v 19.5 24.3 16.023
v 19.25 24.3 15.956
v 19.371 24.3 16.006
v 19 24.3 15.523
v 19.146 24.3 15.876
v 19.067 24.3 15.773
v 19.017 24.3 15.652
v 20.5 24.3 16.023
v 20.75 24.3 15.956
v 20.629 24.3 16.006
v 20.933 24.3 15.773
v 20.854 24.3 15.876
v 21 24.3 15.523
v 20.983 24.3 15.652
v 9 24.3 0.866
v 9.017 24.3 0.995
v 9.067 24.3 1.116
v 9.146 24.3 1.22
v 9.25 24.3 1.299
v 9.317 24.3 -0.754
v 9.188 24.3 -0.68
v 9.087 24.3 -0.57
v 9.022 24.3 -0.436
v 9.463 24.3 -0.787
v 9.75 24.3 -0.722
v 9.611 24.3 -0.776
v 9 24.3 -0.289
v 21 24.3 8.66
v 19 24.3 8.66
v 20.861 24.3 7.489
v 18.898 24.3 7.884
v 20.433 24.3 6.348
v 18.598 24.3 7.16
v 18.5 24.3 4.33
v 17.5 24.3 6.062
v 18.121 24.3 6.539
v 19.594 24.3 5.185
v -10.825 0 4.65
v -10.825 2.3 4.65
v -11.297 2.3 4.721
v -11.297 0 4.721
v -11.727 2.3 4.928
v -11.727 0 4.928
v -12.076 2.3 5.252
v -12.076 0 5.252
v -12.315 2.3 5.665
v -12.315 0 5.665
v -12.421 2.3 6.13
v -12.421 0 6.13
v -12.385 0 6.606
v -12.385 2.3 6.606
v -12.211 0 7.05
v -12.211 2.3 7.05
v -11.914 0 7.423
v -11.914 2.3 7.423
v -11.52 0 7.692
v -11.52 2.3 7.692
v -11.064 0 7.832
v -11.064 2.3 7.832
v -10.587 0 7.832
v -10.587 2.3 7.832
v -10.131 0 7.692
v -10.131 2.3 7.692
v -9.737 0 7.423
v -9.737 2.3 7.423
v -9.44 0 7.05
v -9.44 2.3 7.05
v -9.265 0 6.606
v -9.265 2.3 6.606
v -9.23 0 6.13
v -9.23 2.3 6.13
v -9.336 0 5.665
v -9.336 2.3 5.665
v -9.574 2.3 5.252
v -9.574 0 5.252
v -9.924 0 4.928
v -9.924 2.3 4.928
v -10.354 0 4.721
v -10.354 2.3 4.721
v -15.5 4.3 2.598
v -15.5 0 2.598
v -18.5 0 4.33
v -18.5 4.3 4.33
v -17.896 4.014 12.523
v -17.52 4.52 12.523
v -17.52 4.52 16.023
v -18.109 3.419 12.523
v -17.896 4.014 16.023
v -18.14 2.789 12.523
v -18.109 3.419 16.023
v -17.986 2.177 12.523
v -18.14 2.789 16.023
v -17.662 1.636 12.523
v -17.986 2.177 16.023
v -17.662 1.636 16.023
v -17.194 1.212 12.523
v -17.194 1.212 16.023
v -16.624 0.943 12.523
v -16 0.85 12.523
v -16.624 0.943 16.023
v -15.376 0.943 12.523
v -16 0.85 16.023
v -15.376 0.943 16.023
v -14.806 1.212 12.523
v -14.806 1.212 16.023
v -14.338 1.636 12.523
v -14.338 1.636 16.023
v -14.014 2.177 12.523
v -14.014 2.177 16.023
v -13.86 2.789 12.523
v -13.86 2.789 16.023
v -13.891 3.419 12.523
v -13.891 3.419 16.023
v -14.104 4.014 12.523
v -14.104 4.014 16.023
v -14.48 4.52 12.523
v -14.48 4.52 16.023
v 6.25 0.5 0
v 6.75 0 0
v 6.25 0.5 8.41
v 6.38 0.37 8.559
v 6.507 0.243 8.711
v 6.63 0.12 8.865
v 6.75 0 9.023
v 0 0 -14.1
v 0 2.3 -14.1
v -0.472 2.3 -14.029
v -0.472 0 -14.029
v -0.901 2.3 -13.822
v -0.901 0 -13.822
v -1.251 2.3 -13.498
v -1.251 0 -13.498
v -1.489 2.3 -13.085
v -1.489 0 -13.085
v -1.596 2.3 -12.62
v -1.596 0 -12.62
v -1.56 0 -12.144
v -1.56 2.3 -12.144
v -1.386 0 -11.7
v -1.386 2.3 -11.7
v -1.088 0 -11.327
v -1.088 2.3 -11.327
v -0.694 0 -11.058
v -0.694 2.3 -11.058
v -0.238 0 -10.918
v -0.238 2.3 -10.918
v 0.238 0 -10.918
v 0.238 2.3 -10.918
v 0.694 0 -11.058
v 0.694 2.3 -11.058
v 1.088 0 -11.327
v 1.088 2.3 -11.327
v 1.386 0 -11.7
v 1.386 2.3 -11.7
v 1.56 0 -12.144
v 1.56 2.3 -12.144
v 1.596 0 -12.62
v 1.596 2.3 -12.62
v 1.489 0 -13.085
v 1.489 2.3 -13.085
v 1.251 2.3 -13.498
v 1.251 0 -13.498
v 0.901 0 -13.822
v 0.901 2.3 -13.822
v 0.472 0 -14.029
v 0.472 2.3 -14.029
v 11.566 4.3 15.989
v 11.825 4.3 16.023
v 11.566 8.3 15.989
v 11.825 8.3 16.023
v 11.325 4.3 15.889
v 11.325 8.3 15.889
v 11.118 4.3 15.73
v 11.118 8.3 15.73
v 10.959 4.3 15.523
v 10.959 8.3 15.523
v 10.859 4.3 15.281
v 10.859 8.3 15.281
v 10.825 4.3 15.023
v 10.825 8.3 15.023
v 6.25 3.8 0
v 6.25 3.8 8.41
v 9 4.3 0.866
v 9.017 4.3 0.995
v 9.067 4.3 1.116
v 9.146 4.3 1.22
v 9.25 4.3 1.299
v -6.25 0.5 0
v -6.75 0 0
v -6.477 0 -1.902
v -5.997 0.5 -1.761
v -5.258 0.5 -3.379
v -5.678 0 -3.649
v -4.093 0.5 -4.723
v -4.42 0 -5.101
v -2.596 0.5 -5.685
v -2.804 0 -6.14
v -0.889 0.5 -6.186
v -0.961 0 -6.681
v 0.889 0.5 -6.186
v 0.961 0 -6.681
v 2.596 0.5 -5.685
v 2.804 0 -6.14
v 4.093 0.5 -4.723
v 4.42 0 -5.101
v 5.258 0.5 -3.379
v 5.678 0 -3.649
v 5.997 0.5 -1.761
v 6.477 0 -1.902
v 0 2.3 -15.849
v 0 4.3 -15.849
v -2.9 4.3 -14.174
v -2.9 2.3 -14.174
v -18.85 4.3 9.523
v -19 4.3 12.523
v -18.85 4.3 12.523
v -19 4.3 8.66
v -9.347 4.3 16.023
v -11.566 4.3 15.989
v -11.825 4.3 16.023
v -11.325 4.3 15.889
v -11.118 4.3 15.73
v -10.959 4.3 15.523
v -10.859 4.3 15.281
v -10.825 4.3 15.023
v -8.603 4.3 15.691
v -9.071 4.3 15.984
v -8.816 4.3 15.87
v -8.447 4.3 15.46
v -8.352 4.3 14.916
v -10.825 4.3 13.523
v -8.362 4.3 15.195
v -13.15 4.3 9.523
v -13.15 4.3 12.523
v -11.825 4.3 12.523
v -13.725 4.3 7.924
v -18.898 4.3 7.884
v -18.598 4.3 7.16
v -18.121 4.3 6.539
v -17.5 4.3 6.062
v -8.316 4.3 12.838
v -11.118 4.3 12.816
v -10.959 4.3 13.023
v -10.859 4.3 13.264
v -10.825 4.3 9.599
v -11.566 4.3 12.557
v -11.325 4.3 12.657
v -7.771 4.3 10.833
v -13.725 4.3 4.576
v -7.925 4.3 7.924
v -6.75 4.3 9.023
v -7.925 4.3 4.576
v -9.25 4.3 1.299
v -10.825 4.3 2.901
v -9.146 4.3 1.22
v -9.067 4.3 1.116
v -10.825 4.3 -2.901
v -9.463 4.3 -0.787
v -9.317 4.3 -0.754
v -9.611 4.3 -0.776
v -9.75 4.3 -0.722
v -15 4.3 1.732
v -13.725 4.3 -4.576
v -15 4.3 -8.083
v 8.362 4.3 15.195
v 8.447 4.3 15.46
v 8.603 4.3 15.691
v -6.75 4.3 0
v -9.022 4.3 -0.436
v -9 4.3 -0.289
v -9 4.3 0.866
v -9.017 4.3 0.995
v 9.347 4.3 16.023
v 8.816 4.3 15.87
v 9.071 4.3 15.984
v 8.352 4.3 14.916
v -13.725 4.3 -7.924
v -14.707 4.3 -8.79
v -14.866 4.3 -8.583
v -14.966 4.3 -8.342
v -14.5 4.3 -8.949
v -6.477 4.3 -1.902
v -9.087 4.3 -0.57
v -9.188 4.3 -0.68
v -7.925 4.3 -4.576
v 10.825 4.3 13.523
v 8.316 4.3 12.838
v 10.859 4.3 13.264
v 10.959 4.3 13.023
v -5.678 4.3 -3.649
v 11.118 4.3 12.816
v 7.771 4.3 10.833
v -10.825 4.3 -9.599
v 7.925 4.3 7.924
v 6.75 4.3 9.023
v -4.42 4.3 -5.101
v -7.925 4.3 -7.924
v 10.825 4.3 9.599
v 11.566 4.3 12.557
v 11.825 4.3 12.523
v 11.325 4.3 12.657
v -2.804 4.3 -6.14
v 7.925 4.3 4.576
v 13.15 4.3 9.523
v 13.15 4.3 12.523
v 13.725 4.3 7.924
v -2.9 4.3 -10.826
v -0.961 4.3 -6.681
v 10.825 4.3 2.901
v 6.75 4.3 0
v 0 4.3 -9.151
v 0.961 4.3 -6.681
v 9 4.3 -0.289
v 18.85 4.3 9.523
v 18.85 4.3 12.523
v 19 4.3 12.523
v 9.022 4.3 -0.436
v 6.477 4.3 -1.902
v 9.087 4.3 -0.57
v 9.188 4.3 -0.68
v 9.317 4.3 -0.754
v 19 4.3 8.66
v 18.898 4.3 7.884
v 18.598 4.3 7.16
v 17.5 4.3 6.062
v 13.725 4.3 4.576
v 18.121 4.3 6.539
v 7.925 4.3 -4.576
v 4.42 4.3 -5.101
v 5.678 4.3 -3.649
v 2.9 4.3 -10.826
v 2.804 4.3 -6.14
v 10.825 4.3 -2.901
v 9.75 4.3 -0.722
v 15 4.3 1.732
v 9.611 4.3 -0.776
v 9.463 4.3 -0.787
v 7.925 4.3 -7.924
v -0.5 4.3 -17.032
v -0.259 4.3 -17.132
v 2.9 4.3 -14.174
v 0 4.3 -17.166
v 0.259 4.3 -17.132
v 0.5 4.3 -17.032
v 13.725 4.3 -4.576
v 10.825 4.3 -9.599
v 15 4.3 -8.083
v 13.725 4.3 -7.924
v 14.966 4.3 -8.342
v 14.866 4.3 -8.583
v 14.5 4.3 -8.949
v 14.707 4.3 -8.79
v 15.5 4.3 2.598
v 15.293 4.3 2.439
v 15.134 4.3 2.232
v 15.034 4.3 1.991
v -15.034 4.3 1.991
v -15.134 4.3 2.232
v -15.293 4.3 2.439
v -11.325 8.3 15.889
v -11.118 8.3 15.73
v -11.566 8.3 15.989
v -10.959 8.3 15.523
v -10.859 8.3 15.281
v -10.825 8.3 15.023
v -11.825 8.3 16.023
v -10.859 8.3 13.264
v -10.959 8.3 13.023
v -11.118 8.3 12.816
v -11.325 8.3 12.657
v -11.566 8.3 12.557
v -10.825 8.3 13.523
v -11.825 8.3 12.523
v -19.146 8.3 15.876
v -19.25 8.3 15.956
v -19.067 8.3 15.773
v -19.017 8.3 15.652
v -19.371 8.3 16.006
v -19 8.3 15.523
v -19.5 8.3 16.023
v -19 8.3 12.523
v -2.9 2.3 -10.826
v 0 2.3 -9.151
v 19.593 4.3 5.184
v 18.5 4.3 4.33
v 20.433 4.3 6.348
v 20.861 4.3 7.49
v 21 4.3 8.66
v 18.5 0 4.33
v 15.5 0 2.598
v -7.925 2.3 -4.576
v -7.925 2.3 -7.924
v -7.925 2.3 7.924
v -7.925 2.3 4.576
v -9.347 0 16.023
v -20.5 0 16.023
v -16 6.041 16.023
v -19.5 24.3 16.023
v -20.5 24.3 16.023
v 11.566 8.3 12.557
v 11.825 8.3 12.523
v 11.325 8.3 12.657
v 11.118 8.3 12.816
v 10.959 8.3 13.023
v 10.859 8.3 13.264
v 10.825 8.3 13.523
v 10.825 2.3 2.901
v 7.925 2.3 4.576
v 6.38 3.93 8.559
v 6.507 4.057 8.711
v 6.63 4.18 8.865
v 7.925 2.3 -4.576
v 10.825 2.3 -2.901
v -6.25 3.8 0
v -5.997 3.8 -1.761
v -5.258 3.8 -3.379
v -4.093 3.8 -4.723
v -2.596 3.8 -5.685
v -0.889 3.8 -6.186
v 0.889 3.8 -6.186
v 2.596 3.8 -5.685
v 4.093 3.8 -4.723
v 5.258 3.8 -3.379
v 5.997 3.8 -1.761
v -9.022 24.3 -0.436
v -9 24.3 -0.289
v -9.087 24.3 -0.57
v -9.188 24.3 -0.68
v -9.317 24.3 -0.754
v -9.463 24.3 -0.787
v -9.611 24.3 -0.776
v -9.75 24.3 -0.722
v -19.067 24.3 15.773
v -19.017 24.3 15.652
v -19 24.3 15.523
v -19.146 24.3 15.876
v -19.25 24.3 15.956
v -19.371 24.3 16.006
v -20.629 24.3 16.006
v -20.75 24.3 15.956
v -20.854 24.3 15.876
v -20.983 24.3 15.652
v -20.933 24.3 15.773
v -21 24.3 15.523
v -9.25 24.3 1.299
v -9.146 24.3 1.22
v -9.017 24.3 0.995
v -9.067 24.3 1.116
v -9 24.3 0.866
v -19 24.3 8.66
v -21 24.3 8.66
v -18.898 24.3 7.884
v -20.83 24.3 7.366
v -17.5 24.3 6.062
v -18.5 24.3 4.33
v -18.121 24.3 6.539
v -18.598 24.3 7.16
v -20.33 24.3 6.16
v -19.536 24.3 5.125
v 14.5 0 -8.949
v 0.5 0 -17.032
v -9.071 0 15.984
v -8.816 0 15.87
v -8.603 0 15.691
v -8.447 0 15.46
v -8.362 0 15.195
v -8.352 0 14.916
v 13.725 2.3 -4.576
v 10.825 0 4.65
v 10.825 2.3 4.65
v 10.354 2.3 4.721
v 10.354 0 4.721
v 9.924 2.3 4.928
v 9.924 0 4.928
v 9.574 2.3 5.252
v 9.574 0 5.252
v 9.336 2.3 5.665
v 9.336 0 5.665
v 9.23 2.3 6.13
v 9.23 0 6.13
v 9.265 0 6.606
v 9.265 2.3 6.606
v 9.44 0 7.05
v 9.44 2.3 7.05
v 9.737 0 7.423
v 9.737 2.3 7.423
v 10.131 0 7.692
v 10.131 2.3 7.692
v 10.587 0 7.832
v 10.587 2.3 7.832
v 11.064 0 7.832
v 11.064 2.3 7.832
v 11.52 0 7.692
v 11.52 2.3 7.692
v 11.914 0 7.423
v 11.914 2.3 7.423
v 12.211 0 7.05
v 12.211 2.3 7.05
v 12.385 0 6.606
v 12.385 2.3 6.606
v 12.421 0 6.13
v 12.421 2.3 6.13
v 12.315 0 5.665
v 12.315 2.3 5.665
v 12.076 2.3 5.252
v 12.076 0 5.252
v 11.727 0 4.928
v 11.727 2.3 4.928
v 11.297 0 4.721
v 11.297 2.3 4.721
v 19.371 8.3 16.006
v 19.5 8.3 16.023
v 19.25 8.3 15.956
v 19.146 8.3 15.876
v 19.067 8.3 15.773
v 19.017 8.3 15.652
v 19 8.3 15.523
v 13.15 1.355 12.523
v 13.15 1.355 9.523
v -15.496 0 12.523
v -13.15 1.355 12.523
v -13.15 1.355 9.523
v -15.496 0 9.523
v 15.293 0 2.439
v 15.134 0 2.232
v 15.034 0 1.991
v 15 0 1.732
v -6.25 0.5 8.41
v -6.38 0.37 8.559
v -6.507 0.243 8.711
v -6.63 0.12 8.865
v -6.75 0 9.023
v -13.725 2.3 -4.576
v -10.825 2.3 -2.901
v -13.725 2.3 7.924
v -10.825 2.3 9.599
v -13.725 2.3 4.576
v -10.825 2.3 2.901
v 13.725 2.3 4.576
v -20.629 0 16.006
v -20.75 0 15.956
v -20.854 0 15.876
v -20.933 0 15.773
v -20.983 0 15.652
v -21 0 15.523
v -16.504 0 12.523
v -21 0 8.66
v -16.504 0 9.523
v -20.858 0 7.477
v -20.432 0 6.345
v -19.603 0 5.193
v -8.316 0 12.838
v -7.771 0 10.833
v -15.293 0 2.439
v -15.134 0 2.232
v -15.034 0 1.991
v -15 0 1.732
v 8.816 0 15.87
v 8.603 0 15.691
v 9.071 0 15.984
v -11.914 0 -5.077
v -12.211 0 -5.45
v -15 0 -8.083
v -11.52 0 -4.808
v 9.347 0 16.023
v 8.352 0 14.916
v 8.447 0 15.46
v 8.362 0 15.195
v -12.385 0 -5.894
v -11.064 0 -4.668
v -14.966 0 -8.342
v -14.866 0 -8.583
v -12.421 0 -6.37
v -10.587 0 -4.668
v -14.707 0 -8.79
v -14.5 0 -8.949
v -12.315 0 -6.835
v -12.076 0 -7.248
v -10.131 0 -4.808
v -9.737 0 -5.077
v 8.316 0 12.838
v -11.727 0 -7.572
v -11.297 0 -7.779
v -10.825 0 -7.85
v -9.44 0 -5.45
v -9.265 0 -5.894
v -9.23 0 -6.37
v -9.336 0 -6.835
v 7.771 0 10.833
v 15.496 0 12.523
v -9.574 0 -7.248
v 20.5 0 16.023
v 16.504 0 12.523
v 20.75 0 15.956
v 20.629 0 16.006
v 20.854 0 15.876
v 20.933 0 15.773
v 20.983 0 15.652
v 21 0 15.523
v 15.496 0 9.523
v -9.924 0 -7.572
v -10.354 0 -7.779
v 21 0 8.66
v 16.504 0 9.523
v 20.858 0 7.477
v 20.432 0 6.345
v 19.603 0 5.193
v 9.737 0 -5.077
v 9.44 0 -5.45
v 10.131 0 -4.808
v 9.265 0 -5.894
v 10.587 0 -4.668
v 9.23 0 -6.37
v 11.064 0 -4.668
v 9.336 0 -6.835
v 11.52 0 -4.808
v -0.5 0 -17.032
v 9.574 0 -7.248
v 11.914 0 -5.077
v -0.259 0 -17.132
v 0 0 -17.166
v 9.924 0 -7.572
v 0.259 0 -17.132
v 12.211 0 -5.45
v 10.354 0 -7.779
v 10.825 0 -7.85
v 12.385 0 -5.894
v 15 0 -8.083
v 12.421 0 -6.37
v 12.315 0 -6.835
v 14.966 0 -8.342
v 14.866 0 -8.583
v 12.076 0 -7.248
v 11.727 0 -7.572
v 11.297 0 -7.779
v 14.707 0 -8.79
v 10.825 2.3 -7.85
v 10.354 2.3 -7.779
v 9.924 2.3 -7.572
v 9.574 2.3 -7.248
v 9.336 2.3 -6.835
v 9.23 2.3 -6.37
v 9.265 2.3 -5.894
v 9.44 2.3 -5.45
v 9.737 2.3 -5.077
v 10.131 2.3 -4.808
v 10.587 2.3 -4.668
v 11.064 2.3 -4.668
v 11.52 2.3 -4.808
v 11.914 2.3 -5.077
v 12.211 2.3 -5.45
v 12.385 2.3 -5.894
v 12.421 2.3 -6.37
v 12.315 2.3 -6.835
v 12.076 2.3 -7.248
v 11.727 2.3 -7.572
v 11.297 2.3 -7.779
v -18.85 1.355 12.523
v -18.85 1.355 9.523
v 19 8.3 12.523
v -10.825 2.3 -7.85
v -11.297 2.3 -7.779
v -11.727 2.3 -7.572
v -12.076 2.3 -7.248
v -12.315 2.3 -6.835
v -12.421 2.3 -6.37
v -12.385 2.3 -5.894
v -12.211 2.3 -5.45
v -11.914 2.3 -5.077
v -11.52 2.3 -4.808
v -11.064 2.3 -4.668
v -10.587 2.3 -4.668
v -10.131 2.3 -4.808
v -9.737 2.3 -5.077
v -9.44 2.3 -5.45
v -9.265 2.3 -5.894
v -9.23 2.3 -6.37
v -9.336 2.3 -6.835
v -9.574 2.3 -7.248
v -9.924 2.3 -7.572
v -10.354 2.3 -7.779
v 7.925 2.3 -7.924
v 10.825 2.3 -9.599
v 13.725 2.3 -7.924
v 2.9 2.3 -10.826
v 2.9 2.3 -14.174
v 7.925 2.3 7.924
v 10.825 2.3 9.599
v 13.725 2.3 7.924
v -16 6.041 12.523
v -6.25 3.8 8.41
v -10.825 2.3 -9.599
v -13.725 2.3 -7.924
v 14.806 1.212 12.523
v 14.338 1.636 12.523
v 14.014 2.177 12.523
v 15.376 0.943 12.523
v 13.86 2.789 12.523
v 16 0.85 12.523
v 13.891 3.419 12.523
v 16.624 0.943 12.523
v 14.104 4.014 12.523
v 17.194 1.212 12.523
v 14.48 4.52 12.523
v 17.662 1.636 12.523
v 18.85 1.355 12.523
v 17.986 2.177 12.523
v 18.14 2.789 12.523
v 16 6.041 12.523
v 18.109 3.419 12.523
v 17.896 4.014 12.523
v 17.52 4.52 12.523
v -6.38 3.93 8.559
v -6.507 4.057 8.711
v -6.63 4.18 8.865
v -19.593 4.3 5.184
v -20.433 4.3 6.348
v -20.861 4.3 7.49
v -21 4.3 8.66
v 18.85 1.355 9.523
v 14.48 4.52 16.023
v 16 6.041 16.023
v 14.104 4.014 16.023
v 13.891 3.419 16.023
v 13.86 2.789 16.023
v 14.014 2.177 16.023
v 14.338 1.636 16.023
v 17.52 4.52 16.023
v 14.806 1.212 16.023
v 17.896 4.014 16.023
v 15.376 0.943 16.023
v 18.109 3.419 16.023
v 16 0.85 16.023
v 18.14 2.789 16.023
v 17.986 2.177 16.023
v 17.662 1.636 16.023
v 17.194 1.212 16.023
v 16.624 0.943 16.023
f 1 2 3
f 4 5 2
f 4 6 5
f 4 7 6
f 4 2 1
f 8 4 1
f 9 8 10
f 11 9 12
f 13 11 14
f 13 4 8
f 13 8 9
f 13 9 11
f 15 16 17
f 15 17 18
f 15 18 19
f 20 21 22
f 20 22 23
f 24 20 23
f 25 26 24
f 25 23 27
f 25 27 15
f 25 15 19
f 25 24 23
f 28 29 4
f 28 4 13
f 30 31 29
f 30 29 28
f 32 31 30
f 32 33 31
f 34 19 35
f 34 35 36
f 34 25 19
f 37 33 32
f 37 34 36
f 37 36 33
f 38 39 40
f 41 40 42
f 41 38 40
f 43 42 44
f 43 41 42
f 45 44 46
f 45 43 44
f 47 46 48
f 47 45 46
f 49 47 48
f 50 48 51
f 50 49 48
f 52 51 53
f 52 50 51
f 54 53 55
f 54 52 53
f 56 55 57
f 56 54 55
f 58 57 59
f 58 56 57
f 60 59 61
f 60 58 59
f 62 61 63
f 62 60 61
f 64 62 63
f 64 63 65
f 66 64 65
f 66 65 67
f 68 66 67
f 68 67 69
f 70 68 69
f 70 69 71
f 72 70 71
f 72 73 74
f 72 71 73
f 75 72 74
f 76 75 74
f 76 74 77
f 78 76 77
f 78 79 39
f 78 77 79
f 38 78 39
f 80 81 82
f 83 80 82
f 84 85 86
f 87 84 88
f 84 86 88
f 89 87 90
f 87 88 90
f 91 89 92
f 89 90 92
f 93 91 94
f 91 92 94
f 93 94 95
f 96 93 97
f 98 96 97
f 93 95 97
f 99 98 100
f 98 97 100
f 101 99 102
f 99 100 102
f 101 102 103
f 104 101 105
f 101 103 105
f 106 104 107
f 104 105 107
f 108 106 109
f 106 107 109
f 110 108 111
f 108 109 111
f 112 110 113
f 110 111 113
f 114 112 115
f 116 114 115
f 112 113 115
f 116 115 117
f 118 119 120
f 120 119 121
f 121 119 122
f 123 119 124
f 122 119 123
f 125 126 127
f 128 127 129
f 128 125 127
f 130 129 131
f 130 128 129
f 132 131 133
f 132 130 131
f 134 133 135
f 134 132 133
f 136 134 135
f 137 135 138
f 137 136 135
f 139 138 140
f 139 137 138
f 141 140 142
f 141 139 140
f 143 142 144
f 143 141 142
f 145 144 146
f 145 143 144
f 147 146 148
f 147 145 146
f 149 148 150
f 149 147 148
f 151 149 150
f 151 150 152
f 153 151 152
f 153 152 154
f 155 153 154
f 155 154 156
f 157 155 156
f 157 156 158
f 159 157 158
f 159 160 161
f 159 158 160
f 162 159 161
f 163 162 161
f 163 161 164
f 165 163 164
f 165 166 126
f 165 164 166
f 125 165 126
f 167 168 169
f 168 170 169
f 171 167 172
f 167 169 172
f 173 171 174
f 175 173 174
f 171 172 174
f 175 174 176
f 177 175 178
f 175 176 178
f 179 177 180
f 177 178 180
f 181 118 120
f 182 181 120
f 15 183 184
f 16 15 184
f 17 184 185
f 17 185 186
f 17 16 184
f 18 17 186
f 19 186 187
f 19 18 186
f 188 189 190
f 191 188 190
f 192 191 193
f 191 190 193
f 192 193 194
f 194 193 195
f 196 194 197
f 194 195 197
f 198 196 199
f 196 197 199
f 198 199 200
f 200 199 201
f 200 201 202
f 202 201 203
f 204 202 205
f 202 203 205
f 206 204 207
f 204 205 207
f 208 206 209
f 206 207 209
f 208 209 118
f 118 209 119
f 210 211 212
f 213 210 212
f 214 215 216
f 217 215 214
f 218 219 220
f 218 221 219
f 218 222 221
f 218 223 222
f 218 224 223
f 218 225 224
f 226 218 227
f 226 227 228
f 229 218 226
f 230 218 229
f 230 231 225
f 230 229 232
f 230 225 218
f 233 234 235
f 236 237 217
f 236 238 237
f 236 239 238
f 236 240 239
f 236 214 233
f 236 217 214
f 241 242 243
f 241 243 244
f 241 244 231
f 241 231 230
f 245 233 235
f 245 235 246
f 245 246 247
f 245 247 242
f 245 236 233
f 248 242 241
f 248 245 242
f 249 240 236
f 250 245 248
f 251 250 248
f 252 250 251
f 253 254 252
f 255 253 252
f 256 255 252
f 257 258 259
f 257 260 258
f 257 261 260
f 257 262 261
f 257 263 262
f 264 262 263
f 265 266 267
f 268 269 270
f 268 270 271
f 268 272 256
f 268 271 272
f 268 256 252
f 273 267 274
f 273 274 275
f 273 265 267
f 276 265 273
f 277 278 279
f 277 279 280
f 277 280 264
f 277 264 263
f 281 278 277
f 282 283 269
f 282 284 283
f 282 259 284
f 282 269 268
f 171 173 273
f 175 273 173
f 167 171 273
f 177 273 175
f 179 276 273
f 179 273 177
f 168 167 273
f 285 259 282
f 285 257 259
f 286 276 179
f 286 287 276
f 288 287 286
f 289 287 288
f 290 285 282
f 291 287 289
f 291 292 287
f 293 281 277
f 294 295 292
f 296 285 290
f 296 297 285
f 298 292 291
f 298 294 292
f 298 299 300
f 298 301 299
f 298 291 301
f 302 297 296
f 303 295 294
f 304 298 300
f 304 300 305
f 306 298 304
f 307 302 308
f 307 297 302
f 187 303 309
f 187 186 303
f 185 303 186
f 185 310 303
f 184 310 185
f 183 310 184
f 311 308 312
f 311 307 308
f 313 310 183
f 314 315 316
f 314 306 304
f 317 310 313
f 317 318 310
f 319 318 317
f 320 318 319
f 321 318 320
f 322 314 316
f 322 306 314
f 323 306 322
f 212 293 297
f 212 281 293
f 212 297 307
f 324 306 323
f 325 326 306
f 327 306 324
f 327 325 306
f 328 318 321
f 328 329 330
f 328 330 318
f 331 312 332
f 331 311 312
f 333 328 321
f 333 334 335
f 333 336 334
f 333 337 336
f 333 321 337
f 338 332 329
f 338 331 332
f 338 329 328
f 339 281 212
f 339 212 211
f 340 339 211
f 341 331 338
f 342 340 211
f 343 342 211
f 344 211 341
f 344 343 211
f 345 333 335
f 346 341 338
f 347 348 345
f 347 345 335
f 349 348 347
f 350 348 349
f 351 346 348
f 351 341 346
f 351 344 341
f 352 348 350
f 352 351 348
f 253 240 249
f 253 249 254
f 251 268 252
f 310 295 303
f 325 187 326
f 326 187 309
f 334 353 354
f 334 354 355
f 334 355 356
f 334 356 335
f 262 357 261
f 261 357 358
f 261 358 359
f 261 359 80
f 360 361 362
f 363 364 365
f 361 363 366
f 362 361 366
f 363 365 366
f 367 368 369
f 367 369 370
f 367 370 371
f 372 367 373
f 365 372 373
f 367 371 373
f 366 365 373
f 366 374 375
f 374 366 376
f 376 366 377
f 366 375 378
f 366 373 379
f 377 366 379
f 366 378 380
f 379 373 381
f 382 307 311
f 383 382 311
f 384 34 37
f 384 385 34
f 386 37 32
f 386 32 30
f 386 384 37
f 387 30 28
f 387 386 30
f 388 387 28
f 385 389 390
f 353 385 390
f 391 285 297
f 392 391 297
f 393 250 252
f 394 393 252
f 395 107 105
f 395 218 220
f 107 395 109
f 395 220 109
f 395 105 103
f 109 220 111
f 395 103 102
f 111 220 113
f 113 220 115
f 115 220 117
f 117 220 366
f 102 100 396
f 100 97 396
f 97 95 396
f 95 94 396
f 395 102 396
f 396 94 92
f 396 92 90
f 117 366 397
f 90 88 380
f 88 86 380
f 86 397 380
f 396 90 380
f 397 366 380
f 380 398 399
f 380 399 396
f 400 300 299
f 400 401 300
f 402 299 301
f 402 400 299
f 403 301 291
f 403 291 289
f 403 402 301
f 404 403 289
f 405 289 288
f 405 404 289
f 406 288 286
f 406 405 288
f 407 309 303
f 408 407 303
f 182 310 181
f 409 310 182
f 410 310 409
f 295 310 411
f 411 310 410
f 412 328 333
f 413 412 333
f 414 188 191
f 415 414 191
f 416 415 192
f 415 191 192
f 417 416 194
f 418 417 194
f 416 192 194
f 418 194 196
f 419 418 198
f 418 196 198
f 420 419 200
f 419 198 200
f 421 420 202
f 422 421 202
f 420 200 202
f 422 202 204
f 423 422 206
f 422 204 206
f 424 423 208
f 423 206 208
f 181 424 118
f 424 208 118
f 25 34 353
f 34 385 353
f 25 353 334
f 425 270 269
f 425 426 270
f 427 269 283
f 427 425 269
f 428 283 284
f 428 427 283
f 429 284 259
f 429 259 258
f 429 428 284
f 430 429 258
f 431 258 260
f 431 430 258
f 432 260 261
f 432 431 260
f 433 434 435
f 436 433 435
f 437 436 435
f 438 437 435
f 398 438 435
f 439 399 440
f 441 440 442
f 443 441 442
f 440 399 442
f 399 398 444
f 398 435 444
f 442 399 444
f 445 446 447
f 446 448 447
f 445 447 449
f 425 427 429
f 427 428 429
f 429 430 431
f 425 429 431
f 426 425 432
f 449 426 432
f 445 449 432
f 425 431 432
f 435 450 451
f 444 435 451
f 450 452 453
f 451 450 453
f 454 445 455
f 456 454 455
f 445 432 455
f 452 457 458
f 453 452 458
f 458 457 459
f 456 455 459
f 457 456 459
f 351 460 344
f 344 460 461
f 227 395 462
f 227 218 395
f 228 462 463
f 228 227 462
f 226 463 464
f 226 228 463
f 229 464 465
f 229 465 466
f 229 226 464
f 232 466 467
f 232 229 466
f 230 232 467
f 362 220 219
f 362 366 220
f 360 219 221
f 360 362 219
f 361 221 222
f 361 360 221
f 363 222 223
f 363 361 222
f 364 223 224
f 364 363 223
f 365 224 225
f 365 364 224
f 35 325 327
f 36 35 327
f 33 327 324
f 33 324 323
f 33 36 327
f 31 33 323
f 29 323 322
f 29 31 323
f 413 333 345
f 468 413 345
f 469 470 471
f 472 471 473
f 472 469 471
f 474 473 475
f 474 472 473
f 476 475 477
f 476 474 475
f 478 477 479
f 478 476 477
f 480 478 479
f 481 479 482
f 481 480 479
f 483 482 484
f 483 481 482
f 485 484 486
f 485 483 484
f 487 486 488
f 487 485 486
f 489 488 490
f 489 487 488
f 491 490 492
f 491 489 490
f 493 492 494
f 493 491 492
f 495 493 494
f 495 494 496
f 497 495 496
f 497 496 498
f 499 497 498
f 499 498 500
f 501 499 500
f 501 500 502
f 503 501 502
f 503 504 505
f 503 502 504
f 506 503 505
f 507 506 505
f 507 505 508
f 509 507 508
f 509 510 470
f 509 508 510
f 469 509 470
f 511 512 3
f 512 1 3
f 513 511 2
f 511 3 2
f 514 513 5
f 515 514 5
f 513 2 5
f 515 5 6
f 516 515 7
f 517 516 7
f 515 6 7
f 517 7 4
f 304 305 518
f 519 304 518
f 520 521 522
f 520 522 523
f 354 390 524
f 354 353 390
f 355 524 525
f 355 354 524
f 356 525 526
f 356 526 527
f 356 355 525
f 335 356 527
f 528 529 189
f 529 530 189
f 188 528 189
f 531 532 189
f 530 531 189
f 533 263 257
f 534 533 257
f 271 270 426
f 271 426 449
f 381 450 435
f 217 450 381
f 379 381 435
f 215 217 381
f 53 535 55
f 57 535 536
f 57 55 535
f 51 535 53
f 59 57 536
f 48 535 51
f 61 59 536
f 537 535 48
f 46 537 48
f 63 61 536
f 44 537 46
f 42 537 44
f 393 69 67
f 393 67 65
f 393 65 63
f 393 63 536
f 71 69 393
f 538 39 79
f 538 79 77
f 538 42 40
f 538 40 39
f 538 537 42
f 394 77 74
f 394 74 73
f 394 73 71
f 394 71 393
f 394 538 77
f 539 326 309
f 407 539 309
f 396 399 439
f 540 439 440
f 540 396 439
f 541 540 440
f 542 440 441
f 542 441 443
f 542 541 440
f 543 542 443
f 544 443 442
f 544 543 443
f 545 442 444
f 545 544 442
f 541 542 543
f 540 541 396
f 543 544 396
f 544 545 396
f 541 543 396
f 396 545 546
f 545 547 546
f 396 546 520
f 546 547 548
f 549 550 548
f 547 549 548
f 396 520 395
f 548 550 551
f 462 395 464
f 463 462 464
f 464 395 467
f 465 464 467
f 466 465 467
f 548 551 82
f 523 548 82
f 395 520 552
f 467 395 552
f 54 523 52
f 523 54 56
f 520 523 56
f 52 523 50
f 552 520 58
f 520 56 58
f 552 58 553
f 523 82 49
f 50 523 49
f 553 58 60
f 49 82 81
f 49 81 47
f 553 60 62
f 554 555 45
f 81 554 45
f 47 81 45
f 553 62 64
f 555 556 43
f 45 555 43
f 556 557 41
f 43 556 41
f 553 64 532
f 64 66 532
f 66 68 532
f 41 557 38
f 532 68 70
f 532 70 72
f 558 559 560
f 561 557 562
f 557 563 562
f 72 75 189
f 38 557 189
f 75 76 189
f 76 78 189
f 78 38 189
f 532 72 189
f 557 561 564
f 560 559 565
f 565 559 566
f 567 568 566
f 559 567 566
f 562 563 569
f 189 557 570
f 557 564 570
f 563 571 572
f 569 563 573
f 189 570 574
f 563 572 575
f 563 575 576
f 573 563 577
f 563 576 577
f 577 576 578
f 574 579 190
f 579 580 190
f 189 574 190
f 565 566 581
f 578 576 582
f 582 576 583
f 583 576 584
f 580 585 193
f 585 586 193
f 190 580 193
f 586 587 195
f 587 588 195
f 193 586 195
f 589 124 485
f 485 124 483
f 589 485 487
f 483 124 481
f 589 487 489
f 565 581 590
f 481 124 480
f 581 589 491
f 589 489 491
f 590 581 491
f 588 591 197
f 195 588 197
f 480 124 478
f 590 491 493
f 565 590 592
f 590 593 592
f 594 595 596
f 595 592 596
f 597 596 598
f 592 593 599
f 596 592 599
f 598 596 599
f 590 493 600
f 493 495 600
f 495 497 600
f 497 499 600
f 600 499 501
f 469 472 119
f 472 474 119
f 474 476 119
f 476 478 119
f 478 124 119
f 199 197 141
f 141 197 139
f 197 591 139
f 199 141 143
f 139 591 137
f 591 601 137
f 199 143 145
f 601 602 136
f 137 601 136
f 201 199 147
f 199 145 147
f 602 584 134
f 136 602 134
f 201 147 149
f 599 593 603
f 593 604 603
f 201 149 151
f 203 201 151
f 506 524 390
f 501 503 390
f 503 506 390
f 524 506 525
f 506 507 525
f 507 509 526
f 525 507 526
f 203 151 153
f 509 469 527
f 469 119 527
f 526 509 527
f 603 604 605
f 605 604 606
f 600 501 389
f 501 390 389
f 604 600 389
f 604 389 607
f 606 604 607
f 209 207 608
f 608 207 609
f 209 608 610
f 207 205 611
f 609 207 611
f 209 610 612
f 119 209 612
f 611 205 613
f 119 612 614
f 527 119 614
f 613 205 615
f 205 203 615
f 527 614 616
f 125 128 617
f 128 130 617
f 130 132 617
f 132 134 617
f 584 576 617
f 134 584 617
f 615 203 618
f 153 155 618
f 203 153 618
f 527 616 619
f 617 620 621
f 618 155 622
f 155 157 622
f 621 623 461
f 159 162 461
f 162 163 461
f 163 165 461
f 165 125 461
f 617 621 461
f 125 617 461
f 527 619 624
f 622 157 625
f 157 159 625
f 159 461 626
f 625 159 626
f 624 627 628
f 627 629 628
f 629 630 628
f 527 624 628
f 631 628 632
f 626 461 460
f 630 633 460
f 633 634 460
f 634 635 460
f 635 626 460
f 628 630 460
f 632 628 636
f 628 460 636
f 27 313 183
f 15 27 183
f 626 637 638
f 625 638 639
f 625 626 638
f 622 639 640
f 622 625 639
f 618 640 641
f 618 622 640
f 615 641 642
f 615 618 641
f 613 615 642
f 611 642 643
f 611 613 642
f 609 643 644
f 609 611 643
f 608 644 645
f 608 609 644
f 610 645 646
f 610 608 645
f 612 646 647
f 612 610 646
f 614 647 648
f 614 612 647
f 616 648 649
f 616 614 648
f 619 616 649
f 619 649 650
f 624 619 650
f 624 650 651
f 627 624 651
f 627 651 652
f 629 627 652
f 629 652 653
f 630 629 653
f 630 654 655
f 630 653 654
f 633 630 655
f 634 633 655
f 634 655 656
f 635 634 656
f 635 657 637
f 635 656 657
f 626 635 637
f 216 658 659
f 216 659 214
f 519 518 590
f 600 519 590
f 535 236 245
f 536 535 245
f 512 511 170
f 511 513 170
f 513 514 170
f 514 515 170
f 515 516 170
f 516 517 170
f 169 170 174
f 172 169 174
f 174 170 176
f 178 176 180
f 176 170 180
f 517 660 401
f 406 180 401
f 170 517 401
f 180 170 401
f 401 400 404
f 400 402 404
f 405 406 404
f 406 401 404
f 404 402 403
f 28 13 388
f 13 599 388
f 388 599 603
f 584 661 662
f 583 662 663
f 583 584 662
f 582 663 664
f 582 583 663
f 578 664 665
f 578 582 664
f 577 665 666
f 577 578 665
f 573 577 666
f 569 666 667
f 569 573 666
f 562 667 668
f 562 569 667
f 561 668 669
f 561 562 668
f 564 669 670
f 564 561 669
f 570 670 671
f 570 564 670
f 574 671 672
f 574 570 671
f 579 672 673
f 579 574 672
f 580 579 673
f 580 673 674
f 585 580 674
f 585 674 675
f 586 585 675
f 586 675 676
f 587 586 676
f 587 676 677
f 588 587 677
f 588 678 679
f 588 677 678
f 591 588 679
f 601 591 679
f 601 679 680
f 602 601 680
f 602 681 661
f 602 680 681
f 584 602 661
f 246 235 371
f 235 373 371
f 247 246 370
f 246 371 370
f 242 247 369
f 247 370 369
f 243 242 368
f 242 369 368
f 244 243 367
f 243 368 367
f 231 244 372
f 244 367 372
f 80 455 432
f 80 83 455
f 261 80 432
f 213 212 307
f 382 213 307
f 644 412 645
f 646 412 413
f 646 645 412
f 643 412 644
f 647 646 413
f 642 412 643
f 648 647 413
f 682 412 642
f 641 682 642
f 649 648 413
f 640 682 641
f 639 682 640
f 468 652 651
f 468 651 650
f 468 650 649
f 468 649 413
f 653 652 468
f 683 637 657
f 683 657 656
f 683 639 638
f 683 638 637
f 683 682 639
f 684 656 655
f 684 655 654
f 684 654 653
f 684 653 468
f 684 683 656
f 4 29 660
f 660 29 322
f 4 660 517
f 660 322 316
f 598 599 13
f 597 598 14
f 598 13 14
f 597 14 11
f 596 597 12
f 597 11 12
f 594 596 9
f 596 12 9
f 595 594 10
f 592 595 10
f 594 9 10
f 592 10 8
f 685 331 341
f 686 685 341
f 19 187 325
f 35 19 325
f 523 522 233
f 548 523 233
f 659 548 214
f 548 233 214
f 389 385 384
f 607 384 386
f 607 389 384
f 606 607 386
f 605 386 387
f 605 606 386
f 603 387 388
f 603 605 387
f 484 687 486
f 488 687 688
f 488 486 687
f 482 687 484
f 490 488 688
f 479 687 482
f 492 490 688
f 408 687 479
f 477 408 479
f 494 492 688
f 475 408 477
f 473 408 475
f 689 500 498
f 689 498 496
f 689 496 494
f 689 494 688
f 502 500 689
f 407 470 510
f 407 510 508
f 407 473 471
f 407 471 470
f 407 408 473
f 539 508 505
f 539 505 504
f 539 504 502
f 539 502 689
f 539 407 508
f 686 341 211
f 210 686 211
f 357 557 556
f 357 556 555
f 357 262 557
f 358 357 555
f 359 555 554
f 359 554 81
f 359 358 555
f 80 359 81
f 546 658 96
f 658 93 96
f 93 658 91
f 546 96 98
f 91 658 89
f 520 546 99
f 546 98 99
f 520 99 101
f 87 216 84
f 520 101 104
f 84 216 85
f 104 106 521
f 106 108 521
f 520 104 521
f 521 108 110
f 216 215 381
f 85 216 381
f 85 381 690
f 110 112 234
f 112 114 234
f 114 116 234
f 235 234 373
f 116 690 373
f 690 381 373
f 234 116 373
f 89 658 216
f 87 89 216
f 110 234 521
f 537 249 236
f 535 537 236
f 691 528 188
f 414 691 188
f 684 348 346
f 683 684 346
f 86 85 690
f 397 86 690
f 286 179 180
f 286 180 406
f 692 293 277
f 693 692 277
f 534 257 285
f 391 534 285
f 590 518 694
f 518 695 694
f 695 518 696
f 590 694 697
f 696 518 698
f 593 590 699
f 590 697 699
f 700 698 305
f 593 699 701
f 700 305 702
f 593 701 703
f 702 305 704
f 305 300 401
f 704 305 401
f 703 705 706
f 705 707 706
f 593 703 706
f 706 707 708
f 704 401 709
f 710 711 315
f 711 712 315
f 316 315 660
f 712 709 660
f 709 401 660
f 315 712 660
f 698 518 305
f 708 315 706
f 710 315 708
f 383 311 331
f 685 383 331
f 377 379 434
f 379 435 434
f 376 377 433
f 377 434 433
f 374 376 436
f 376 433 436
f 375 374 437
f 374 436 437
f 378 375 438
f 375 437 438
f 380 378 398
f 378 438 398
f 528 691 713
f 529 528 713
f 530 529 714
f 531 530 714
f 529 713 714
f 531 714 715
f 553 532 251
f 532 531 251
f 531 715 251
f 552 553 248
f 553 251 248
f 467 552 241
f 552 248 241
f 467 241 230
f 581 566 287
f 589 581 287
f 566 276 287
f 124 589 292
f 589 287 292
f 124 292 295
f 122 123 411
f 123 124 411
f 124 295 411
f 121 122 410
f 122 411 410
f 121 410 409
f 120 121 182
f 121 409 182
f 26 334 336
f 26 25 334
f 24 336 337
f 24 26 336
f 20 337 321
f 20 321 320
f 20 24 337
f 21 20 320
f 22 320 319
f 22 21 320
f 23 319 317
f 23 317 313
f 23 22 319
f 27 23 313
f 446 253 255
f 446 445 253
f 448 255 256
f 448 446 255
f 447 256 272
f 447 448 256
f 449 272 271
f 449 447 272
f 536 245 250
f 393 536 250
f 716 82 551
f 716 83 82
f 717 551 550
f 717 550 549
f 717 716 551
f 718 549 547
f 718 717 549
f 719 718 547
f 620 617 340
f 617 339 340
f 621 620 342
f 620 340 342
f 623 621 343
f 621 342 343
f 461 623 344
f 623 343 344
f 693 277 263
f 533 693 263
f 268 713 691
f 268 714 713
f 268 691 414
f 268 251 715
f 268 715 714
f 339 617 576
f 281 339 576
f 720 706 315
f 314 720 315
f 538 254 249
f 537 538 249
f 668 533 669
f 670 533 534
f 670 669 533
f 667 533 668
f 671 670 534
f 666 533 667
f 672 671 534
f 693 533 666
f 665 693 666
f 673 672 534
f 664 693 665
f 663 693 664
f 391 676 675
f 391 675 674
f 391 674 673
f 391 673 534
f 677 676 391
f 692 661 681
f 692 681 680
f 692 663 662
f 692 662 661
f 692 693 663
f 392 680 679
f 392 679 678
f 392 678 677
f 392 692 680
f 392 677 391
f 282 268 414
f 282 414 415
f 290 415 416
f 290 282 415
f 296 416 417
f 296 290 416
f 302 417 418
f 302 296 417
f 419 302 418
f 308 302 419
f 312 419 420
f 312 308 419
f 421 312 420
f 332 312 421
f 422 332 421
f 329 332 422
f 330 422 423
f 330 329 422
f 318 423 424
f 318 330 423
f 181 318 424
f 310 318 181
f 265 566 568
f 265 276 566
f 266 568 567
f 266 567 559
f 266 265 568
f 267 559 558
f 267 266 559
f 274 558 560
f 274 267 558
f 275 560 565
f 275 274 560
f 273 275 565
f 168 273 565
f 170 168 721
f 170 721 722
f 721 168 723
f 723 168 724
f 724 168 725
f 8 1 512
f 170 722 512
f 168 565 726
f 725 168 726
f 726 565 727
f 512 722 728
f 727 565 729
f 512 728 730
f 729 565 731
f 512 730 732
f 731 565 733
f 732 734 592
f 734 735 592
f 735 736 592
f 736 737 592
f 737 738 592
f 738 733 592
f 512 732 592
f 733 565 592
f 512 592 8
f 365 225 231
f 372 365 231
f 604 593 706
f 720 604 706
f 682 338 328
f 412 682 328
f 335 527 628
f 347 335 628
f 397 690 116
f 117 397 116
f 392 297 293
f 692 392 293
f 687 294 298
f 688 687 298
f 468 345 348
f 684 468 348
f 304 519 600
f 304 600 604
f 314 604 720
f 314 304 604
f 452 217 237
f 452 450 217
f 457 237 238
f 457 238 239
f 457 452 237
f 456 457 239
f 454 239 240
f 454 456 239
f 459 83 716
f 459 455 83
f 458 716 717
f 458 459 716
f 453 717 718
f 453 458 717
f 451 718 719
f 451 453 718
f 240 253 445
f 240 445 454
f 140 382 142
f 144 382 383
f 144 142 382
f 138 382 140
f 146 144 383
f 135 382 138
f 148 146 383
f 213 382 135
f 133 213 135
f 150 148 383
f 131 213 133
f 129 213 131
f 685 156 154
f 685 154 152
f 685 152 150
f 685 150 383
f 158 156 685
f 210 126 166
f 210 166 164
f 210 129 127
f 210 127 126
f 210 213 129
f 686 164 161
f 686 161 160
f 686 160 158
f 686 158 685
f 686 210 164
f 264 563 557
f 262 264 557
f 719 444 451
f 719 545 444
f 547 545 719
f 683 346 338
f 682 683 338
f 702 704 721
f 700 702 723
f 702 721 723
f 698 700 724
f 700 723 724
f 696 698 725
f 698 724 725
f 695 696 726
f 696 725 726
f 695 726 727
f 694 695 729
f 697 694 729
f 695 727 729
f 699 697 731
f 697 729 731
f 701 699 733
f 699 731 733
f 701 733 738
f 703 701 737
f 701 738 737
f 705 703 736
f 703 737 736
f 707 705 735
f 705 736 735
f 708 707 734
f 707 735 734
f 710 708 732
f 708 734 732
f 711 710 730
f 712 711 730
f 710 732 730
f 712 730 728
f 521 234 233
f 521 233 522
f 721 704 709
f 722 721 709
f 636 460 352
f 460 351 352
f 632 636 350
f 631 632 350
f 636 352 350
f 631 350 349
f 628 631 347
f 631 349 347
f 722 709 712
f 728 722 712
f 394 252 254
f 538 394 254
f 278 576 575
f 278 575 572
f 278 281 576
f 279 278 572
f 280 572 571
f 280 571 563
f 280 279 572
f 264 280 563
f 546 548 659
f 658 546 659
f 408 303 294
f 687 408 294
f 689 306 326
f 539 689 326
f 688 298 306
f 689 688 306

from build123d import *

# Parameters (mm, degrees)
SKETCH1_R                       = 1.6
BOSS_EXTRUDE1_DEPTH             = 4.3
FILLET1_R                       = 1
CUT_EXTRUDE1_DEPTH              = 2
BOSS_EXTRUDE2_DEPTH             = 4.3
SKETCH4_R                       = 8.4
CUT_EXTRUDE2_DEPTH              = 32.552755501
SKETCH5_W                       = 40
SKETCH5_H                       = 8
CUT_EXTRUDE3_DEPTH              = 32.552755501
MOVE_FACE1_DEPTH                = 4.3
BOSS_EXTRUDE3_START             = 4
BOSS_EXTRUDE3_DEPTH             = 4
SKETCH7_R                       = 2.15
CUT_EXTRUDE4_DEPTH              = 3.5
CUT_EXTRUDE5_DEPTH              = 3
SKETCH9_W                       = 21.650635094
SKETCH9_H                       = 3.5
CUT_EXTRUDE6_DEPTH              = 4
FILLET2_R                       = 1
CHAMFER1_SIZE                   = 0.5
CUT_EXTRUDE7_DEPTH              = 3.5
BOSS_EXTRUDE4_REACH             = 28.705
BOSS_EXTRUDE4_DIRECTION_2_DEPTH = 20
FILLET3_R                       = 3
FILLET4_R                       = 5
FILLET5_R                       = 0.5


# Read off the part's stored shape, not the designer's step: Move Face1
with BuildPart() as part:
    # Sketch1 → Boss-Extrude1 (new body)
    with BuildSketch(Plane(origin=(0, 0, 0), x_dir=(1, 0, 0), z_dir=(0, 1, 0))):
        with BuildLine():
            Line((0, 17.320508076), (-15, 8.660254038))
            Line((-15, 8.660254038), (-15, -8.660254038))
            Line((-15, -8.660254038), (-6.25, -13.712068893))
            Line((-6.25, -13.712068893), (-6.25, 0))
            ThreePointArc((-6.25, 0), (0, 6.25), (6.25, 0))
            Line((6.25, 0), (6.25, -13.712068893))
            Line((6.25, -13.712068893), (15, -8.660254038))
            Line((15, -8.660254038), (15, 8.660254038))
            Line((15, 8.660254038), (0, 17.320508076))
        make_face()
        with Locations(Location((0, 12.5, 0), (0, 0, 90))):
            Circle(SKETCH1_R, mode=Mode.SUBTRACT)
        with Locations(Location((10.825317547, 6.25, 0), (0, 0, 90))):
            Circle(SKETCH1_R, mode=Mode.SUBTRACT)
        with Locations(Location((10.825317547, -6.25, 0), (0, 0, 90))):
            Circle(SKETCH1_R, mode=Mode.SUBTRACT)
        with Locations(Location((-10.825317547, -6.25, 0), (0, 0, 90))):
            Circle(SKETCH1_R, mode=Mode.SUBTRACT)
        with Locations(Location((-10.825317547, 6.25, 0), (0, 0, 90))):
            Circle(SKETCH1_R, mode=Mode.SUBTRACT)
    extrude(amount=BOSS_EXTRUDE1_DEPTH)

    # Fillet1
    fillet1_edges = [part.edges().sort_by_distance(p)[0] for p in [
        (15, 2.15, -8.660254038),
        (15, 2.15, 8.660254038),
        (6.25, 2.15, 13.712068893),
        (-6.25, 2.15, 13.712068893),
        (-15, 2.15, 8.660254038),
        (-15, 2.15, -8.660254038),
        (0, 2.15, -17.320508076),
    ]]
    fillet(fillet1_edges, radius=FILLET1_R)

    # Sketch2 → Cut-Extrude1 (cut)
    with BuildSketch(Plane(origin=(0, 4.3, 0), x_dir=(1, 0, 0), z_dir=(0, 1, 0))):
        Polygon((0, 15.848631561), (-2.9, 14.174315781), (-2.9, 10.825684219), (0, 9.151368439), (2.9, 10.825684219), (2.9, 14.174315781), align=None)
        Polygon((13.725317547, 4.575684219), (13.725317547, 7.924315781), (10.825317547, 9.598631561), (7.925317547, 7.924315781), (7.925317547, 4.575684219), (10.825317547, 2.901368439), align=None)
        Polygon((13.725317547, -4.575684219), (10.825317547, -2.901368439), (7.925317547, -4.575684219), (7.925317547, -7.924315781), (10.825317547, -9.598631561), (13.725317547, -7.924315781), align=None)
        Polygon((-13.725317547, -4.575684219), (-13.725317547, -7.924315781), (-10.825317547, -9.598631561), (-7.925317547, -7.924315781), (-7.925317547, -4.575684219), (-10.825317547, -2.901368439), align=None)
        Polygon((-13.725317547, 7.924315781), (-13.725317547, 4.575684219), (-10.825317547, 2.901368439), (-7.925317547, 4.575684219), (-7.925317547, 7.924315781), (-10.825317547, 9.598631561), align=None)
    extrude(amount=-CUT_EXTRUDE1_DEPTH, mode=Mode.SUBTRACT)

    # Sketch3 → Boss-Extrude2 (add)
    with BuildSketch(Plane(origin=(0, 4.3, 0), x_dir=(1, 0, 0), z_dir=(0, 1, 0))):
        with BuildLine():
            Line((-15, -8.082903769), (-6.25, -11.980018086))
            Line((-6.25, -11.980018086), (6.25, -11.980018086))
            Line((6.25, -11.980018086), (15, -8.082903769))
            Line((15, -8.082903769), (20, -10.969655115))
            Line((20, -10.969655115), (20, -22.376680266))
            ThreePointArc((20, -22.376680266), (19.517914755, -23.540537003), (18.354058018, -24.022622248))
            Line((18.354058018, -24.022622248), (-18.354058018, -24.022622248))
            ThreePointArc((-18.354058018, -24.022622248), (-19.517914755, -23.540537003), (-20, -22.376680266))
            Line((-20, -22.376680266), (-20, -10.969655115))
            Line((-20, -10.969655115), (-15, -8.082903769))
        make_face()
    extrude(amount=-BOSS_EXTRUDE2_DEPTH)

    # Sketch4 → Cut-Extrude2 (cut, through all)
    with BuildSketch(Plane(origin=(0, 4.3, 0), x_dir=(1, 0, 0), z_dir=(0, 1, 0))):
        with Locations((0, -14.022622248)):
            Circle(SKETCH4_R)
    extrude(amount=-CUT_EXTRUDE2_DEPTH, mode=Mode.SUBTRACT)

    # Sketch5 → Cut-Extrude3 (cut, through all)
    with BuildSketch(Plane(origin=(0, 4.3, 0), x_dir=(1, 0, 0), z_dir=(0, 1, 0))):
        with Locations((0, -20.022622248)):
            Rectangle(SKETCH5_W, SKETCH5_H)
    extrude(amount=-CUT_EXTRUDE3_DEPTH, mode=Mode.SUBTRACT)

    # Move Face1 outline → Move Face1 (add)
    with BuildSketch(Plane(origin=(0, 0, 0), x_dir=(1, 0, 0), z_dir=(0, 1, 0))):
        Polygon((20, -10.969655115), (20, -5.196152423), (15, -2.309401077), (15, -8.082903769), align=None)
        Polygon((-15, -2.309401077), (-20, -5.196152423), (-20, -10.969655115), (-15, -8.082903769), align=None)
    extrude(amount=MOVE_FACE1_DEPTH)

    # Sketch6 → Boss-Extrude3 (add)
    with BuildSketch(Plane(origin=(0, 4.3, 0), x_dir=(1, 0, 0), z_dir=(0, 1, 0)).offset(BOSS_EXTRUDE3_START)):
        with BuildLine():
            Line((-20, -12.522622248), (-8.264986388, -12.522622248))
            ThreePointArc((-8.264986388, -12.522622248), (-8.396109903, -14.278236217), (-8.158431222, -16.022622248))
            Line((-8.158431222, -16.022622248), (-20, -16.022622248))
            Line((-20, -16.022622248), (-20, -12.522622248))
        make_face()
        with BuildLine():
            Line((8.264986388, -12.522622248), (20, -12.522622248))
            Line((20, -12.522622248), (20, -16.022622248))
            Line((20, -16.022622248), (8.158431222, -16.022622248))
            ThreePointArc((8.158431222, -16.022622248), (8.396109903, -14.278236217), (8.264986388, -12.522622248))
        make_face()
    extrude(amount=-BOSS_EXTRUDE3_DEPTH)

    # Sketch7 → Cut-Extrude4 (cut)
    with BuildSketch(Plane.XY.offset(16.022622248)):
        with Locations((-16, 3)):
            Circle(SKETCH7_R)
        with Locations((16, 3)):
            Circle(SKETCH7_R)
    extrude(amount=-CUT_EXTRUDE4_DEPTH, mode=Mode.SUBTRACT)

    # Sketch8 → Cut-Extrude5 (cut)
    with BuildSketch(Plane(origin=(0, 0, 12.522622248), x_dir=(-1, 0, 0), z_dir=(0, 0, -1))):
        Polygon((16, 6.290896534), (13.15, 4.645448267), (13.15, 1.354551733), (16, -0.290896534), (18.85, 1.354551733), (18.85, 4.645448267), align=None)
        Polygon((-18.85, 4.645448267), (-16, 6.290896534), (-13.15, 4.645448267), (-13.15, 1.354551733), (-16, -0.290896534), (-18.85, 1.354551733), align=None)
    extrude(amount=CUT_EXTRUDE5_DEPTH, mode=Mode.SUBTRACT)

    # Sketch9 → Cut-Extrude6 (cut)
    with BuildSketch(Plane(origin=(0, 4.3, 0), x_dir=(1, 0, 0), z_dir=(0, 1, 0))):
        with Locations((0, -14.272622248)):
            Rectangle(SKETCH9_W, SKETCH9_H)
    extrude(amount=CUT_EXTRUDE6_DEPTH, mode=Mode.SUBTRACT)

    # Fillet2
    fillet2_edges = [part.edges().sort_by_distance(p)[0] for p in [
        (20, 2.15, 5.196152423),
        (-20, 2.15, 5.196152423),
        (8.158431222, 2.15, 16.022622248),
        (20, 6.3, 12.522622248),
        (-20, 6.3, 12.522622248),
        (-8.158431222, 2.15, 16.022622248),
        (-10.825317547, 6.3, 16.022622248),
        (10.825317547, 6.3, 12.522622248),
        (-10.825317547, 6.3, 12.522622248),
        (10.825317547, 6.3, 16.022622248),
        (15, 2.15, 2.309401077),
        (-15, 2.15, 2.309401077),
    ]]
    fillet(fillet2_edges, radius=FILLET2_R)

    # Chamfer1
    chamfer1_edges = [part.edges().sort_by_distance(p)[0] for p in [
        (0, 4.3, -6.25),
        (6.25, 4.3, 4.205179445),
        (-6.25, 4.3, 4.205179445),
        (-6.25, 0, 4.205179445),
        (6.25, 0, 4.205179445),
        (0, 0, -6.25),
    ]]
    chamfer(chamfer1_edges, length=CHAMFER1_SIZE)

    # Sketch10 → Cut-Extrude7 (cut)
    with BuildSketch(Plane.XY.offset(16.022622248)):
        with BuildLine():
            Line((-17.52027958, 4.52027958), (-16, 6.040559159))
            Line((-16, 6.040559159), (-14.47972042, 4.52027958))
            ThreePointArc((-14.47972042, 4.52027958), (-16, 0.85), (-17.52027958, 4.52027958))
        make_face()
        with BuildLine():
            Line((14.47972042, 4.52027958), (16, 6.040559159))
            Line((16, 6.040559159), (17.52027958, 4.52027958))
            ThreePointArc((17.52027958, 4.52027958), (16, 0.85), (14.47972042, 4.52027958))
        make_face()
    extrude(amount=-CUT_EXTRUDE7_DEPTH, mode=Mode.SUBTRACT)

    # Boss-Extrude4: up to this face of the body (flat: up to its plane)
    boss_extrude4_end = Plane(part.part.faces().sort_by_distance((-8.607291251, 0, 11.682408659))[0])
    # Sketch11 → Boss-Extrude4 (add, up to the picked face)
    with BuildSketch(Plane(origin=(0, 4.3, 0), x_dir=(1, 0, 0), z_dir=(0, 1, 0)), mode=Mode.PRIVATE) as boss_extrude4_sk1:
        Polygon((9, -1.154700538), (19, -6.92820323), (19, -16.022622248), (21, -16.022622248), (21, -5.773502692), (9, 1.154700538), align=None)
    boss_extrude4_tool1 = split(extrude(boss_extrude4_sk1.sketch, amount=-BOSS_EXTRUDE4_REACH, mode=Mode.PRIVATE), bisect_by=boss_extrude4_end, keep=Keep.BOTH, mode=Mode.PRIVATE)
    # Sketch11 → Boss-Extrude4 (add, up to the picked face)
    with BuildSketch(Plane(origin=(0, 4.3, 0), x_dir=(1, 0, 0), z_dir=(0, 1, 0)), mode=Mode.PRIVATE) as boss_extrude4_sk2:
        Polygon((-9, 1.154700538), (-9, -1.154700538), (-19, -6.92820323), (-19, -16.022622248), (-21, -16.022622248), (-21, -5.773502692), align=None)
    boss_extrude4_tool2 = split(extrude(boss_extrude4_sk2.sketch, amount=-BOSS_EXTRUDE4_REACH, mode=Mode.PRIVATE), bisect_by=boss_extrude4_end, keep=Keep.BOTH, mode=Mode.PRIVATE)
    add(boss_extrude4_tool1.solids().sort_by(Axis((14.104769, 4.3, 3.859987), (0, -1, 0)))[0])
    add(boss_extrude4_tool2.solids().sort_by(Axis((-9.209538, 4.3, 0), (0, -1, 0)))[0])

    # Sketch11 → Boss-Extrude4 direction 2 (add)
    with BuildSketch(Plane(origin=(0, 4.3, 0), x_dir=(1, 0, 0), z_dir=(0, 1, 0))):
        Polygon((9, -1.154700538), (19, -6.92820323), (19, -16.022622248), (21, -16.022622248), (21, -5.773502692), (9, 1.154700538), align=None)
        Polygon((-9, 1.154700538), (-9, -1.154700538), (-19, -6.92820323), (-19, -16.022622248), (-21, -16.022622248), (-21, -5.773502692), align=None)
    extrude(amount=BOSS_EXTRUDE4_DIRECTION_2_DEPTH)

    # Fillet3
    fillet3_edges = [part.edges().sort_by_distance(p)[0] for p in [
        (19, 14.3, 6.92820323),
        (-19, 14.3, 6.92820323),
    ]]
    fillet(fillet3_edges, radius=FILLET3_R)

    # Fillet4
    fillet4_edges = [part.edges().sort_by_distance(p)[0] for p in [
        (21, 12.15, 5.773502692),
        (-21, 12.15, 5.773502692),
    ]]
    fillet(fillet4_edges, radius=FILLET4_R)

    # Fillet5
    fillet5_edges = [part.edges().sort_by_distance(p)[0] for p in [
        (9, 14.3, -1.154700538),
        (9, 14.3, 1.154700538),
        (19, 16.3, 16.022622248),
        (21, 12.15, 16.022622248),
        (-9, 14.3, -1.154700538),
        (-21, 12.15, 16.022622248),
        (-19, 16.3, 16.022622248),
        (-9, 14.3, 1.154700538),
    ]]
    fillet(fillet5_edges, radius=FILLET5_R)


solid = part.part
